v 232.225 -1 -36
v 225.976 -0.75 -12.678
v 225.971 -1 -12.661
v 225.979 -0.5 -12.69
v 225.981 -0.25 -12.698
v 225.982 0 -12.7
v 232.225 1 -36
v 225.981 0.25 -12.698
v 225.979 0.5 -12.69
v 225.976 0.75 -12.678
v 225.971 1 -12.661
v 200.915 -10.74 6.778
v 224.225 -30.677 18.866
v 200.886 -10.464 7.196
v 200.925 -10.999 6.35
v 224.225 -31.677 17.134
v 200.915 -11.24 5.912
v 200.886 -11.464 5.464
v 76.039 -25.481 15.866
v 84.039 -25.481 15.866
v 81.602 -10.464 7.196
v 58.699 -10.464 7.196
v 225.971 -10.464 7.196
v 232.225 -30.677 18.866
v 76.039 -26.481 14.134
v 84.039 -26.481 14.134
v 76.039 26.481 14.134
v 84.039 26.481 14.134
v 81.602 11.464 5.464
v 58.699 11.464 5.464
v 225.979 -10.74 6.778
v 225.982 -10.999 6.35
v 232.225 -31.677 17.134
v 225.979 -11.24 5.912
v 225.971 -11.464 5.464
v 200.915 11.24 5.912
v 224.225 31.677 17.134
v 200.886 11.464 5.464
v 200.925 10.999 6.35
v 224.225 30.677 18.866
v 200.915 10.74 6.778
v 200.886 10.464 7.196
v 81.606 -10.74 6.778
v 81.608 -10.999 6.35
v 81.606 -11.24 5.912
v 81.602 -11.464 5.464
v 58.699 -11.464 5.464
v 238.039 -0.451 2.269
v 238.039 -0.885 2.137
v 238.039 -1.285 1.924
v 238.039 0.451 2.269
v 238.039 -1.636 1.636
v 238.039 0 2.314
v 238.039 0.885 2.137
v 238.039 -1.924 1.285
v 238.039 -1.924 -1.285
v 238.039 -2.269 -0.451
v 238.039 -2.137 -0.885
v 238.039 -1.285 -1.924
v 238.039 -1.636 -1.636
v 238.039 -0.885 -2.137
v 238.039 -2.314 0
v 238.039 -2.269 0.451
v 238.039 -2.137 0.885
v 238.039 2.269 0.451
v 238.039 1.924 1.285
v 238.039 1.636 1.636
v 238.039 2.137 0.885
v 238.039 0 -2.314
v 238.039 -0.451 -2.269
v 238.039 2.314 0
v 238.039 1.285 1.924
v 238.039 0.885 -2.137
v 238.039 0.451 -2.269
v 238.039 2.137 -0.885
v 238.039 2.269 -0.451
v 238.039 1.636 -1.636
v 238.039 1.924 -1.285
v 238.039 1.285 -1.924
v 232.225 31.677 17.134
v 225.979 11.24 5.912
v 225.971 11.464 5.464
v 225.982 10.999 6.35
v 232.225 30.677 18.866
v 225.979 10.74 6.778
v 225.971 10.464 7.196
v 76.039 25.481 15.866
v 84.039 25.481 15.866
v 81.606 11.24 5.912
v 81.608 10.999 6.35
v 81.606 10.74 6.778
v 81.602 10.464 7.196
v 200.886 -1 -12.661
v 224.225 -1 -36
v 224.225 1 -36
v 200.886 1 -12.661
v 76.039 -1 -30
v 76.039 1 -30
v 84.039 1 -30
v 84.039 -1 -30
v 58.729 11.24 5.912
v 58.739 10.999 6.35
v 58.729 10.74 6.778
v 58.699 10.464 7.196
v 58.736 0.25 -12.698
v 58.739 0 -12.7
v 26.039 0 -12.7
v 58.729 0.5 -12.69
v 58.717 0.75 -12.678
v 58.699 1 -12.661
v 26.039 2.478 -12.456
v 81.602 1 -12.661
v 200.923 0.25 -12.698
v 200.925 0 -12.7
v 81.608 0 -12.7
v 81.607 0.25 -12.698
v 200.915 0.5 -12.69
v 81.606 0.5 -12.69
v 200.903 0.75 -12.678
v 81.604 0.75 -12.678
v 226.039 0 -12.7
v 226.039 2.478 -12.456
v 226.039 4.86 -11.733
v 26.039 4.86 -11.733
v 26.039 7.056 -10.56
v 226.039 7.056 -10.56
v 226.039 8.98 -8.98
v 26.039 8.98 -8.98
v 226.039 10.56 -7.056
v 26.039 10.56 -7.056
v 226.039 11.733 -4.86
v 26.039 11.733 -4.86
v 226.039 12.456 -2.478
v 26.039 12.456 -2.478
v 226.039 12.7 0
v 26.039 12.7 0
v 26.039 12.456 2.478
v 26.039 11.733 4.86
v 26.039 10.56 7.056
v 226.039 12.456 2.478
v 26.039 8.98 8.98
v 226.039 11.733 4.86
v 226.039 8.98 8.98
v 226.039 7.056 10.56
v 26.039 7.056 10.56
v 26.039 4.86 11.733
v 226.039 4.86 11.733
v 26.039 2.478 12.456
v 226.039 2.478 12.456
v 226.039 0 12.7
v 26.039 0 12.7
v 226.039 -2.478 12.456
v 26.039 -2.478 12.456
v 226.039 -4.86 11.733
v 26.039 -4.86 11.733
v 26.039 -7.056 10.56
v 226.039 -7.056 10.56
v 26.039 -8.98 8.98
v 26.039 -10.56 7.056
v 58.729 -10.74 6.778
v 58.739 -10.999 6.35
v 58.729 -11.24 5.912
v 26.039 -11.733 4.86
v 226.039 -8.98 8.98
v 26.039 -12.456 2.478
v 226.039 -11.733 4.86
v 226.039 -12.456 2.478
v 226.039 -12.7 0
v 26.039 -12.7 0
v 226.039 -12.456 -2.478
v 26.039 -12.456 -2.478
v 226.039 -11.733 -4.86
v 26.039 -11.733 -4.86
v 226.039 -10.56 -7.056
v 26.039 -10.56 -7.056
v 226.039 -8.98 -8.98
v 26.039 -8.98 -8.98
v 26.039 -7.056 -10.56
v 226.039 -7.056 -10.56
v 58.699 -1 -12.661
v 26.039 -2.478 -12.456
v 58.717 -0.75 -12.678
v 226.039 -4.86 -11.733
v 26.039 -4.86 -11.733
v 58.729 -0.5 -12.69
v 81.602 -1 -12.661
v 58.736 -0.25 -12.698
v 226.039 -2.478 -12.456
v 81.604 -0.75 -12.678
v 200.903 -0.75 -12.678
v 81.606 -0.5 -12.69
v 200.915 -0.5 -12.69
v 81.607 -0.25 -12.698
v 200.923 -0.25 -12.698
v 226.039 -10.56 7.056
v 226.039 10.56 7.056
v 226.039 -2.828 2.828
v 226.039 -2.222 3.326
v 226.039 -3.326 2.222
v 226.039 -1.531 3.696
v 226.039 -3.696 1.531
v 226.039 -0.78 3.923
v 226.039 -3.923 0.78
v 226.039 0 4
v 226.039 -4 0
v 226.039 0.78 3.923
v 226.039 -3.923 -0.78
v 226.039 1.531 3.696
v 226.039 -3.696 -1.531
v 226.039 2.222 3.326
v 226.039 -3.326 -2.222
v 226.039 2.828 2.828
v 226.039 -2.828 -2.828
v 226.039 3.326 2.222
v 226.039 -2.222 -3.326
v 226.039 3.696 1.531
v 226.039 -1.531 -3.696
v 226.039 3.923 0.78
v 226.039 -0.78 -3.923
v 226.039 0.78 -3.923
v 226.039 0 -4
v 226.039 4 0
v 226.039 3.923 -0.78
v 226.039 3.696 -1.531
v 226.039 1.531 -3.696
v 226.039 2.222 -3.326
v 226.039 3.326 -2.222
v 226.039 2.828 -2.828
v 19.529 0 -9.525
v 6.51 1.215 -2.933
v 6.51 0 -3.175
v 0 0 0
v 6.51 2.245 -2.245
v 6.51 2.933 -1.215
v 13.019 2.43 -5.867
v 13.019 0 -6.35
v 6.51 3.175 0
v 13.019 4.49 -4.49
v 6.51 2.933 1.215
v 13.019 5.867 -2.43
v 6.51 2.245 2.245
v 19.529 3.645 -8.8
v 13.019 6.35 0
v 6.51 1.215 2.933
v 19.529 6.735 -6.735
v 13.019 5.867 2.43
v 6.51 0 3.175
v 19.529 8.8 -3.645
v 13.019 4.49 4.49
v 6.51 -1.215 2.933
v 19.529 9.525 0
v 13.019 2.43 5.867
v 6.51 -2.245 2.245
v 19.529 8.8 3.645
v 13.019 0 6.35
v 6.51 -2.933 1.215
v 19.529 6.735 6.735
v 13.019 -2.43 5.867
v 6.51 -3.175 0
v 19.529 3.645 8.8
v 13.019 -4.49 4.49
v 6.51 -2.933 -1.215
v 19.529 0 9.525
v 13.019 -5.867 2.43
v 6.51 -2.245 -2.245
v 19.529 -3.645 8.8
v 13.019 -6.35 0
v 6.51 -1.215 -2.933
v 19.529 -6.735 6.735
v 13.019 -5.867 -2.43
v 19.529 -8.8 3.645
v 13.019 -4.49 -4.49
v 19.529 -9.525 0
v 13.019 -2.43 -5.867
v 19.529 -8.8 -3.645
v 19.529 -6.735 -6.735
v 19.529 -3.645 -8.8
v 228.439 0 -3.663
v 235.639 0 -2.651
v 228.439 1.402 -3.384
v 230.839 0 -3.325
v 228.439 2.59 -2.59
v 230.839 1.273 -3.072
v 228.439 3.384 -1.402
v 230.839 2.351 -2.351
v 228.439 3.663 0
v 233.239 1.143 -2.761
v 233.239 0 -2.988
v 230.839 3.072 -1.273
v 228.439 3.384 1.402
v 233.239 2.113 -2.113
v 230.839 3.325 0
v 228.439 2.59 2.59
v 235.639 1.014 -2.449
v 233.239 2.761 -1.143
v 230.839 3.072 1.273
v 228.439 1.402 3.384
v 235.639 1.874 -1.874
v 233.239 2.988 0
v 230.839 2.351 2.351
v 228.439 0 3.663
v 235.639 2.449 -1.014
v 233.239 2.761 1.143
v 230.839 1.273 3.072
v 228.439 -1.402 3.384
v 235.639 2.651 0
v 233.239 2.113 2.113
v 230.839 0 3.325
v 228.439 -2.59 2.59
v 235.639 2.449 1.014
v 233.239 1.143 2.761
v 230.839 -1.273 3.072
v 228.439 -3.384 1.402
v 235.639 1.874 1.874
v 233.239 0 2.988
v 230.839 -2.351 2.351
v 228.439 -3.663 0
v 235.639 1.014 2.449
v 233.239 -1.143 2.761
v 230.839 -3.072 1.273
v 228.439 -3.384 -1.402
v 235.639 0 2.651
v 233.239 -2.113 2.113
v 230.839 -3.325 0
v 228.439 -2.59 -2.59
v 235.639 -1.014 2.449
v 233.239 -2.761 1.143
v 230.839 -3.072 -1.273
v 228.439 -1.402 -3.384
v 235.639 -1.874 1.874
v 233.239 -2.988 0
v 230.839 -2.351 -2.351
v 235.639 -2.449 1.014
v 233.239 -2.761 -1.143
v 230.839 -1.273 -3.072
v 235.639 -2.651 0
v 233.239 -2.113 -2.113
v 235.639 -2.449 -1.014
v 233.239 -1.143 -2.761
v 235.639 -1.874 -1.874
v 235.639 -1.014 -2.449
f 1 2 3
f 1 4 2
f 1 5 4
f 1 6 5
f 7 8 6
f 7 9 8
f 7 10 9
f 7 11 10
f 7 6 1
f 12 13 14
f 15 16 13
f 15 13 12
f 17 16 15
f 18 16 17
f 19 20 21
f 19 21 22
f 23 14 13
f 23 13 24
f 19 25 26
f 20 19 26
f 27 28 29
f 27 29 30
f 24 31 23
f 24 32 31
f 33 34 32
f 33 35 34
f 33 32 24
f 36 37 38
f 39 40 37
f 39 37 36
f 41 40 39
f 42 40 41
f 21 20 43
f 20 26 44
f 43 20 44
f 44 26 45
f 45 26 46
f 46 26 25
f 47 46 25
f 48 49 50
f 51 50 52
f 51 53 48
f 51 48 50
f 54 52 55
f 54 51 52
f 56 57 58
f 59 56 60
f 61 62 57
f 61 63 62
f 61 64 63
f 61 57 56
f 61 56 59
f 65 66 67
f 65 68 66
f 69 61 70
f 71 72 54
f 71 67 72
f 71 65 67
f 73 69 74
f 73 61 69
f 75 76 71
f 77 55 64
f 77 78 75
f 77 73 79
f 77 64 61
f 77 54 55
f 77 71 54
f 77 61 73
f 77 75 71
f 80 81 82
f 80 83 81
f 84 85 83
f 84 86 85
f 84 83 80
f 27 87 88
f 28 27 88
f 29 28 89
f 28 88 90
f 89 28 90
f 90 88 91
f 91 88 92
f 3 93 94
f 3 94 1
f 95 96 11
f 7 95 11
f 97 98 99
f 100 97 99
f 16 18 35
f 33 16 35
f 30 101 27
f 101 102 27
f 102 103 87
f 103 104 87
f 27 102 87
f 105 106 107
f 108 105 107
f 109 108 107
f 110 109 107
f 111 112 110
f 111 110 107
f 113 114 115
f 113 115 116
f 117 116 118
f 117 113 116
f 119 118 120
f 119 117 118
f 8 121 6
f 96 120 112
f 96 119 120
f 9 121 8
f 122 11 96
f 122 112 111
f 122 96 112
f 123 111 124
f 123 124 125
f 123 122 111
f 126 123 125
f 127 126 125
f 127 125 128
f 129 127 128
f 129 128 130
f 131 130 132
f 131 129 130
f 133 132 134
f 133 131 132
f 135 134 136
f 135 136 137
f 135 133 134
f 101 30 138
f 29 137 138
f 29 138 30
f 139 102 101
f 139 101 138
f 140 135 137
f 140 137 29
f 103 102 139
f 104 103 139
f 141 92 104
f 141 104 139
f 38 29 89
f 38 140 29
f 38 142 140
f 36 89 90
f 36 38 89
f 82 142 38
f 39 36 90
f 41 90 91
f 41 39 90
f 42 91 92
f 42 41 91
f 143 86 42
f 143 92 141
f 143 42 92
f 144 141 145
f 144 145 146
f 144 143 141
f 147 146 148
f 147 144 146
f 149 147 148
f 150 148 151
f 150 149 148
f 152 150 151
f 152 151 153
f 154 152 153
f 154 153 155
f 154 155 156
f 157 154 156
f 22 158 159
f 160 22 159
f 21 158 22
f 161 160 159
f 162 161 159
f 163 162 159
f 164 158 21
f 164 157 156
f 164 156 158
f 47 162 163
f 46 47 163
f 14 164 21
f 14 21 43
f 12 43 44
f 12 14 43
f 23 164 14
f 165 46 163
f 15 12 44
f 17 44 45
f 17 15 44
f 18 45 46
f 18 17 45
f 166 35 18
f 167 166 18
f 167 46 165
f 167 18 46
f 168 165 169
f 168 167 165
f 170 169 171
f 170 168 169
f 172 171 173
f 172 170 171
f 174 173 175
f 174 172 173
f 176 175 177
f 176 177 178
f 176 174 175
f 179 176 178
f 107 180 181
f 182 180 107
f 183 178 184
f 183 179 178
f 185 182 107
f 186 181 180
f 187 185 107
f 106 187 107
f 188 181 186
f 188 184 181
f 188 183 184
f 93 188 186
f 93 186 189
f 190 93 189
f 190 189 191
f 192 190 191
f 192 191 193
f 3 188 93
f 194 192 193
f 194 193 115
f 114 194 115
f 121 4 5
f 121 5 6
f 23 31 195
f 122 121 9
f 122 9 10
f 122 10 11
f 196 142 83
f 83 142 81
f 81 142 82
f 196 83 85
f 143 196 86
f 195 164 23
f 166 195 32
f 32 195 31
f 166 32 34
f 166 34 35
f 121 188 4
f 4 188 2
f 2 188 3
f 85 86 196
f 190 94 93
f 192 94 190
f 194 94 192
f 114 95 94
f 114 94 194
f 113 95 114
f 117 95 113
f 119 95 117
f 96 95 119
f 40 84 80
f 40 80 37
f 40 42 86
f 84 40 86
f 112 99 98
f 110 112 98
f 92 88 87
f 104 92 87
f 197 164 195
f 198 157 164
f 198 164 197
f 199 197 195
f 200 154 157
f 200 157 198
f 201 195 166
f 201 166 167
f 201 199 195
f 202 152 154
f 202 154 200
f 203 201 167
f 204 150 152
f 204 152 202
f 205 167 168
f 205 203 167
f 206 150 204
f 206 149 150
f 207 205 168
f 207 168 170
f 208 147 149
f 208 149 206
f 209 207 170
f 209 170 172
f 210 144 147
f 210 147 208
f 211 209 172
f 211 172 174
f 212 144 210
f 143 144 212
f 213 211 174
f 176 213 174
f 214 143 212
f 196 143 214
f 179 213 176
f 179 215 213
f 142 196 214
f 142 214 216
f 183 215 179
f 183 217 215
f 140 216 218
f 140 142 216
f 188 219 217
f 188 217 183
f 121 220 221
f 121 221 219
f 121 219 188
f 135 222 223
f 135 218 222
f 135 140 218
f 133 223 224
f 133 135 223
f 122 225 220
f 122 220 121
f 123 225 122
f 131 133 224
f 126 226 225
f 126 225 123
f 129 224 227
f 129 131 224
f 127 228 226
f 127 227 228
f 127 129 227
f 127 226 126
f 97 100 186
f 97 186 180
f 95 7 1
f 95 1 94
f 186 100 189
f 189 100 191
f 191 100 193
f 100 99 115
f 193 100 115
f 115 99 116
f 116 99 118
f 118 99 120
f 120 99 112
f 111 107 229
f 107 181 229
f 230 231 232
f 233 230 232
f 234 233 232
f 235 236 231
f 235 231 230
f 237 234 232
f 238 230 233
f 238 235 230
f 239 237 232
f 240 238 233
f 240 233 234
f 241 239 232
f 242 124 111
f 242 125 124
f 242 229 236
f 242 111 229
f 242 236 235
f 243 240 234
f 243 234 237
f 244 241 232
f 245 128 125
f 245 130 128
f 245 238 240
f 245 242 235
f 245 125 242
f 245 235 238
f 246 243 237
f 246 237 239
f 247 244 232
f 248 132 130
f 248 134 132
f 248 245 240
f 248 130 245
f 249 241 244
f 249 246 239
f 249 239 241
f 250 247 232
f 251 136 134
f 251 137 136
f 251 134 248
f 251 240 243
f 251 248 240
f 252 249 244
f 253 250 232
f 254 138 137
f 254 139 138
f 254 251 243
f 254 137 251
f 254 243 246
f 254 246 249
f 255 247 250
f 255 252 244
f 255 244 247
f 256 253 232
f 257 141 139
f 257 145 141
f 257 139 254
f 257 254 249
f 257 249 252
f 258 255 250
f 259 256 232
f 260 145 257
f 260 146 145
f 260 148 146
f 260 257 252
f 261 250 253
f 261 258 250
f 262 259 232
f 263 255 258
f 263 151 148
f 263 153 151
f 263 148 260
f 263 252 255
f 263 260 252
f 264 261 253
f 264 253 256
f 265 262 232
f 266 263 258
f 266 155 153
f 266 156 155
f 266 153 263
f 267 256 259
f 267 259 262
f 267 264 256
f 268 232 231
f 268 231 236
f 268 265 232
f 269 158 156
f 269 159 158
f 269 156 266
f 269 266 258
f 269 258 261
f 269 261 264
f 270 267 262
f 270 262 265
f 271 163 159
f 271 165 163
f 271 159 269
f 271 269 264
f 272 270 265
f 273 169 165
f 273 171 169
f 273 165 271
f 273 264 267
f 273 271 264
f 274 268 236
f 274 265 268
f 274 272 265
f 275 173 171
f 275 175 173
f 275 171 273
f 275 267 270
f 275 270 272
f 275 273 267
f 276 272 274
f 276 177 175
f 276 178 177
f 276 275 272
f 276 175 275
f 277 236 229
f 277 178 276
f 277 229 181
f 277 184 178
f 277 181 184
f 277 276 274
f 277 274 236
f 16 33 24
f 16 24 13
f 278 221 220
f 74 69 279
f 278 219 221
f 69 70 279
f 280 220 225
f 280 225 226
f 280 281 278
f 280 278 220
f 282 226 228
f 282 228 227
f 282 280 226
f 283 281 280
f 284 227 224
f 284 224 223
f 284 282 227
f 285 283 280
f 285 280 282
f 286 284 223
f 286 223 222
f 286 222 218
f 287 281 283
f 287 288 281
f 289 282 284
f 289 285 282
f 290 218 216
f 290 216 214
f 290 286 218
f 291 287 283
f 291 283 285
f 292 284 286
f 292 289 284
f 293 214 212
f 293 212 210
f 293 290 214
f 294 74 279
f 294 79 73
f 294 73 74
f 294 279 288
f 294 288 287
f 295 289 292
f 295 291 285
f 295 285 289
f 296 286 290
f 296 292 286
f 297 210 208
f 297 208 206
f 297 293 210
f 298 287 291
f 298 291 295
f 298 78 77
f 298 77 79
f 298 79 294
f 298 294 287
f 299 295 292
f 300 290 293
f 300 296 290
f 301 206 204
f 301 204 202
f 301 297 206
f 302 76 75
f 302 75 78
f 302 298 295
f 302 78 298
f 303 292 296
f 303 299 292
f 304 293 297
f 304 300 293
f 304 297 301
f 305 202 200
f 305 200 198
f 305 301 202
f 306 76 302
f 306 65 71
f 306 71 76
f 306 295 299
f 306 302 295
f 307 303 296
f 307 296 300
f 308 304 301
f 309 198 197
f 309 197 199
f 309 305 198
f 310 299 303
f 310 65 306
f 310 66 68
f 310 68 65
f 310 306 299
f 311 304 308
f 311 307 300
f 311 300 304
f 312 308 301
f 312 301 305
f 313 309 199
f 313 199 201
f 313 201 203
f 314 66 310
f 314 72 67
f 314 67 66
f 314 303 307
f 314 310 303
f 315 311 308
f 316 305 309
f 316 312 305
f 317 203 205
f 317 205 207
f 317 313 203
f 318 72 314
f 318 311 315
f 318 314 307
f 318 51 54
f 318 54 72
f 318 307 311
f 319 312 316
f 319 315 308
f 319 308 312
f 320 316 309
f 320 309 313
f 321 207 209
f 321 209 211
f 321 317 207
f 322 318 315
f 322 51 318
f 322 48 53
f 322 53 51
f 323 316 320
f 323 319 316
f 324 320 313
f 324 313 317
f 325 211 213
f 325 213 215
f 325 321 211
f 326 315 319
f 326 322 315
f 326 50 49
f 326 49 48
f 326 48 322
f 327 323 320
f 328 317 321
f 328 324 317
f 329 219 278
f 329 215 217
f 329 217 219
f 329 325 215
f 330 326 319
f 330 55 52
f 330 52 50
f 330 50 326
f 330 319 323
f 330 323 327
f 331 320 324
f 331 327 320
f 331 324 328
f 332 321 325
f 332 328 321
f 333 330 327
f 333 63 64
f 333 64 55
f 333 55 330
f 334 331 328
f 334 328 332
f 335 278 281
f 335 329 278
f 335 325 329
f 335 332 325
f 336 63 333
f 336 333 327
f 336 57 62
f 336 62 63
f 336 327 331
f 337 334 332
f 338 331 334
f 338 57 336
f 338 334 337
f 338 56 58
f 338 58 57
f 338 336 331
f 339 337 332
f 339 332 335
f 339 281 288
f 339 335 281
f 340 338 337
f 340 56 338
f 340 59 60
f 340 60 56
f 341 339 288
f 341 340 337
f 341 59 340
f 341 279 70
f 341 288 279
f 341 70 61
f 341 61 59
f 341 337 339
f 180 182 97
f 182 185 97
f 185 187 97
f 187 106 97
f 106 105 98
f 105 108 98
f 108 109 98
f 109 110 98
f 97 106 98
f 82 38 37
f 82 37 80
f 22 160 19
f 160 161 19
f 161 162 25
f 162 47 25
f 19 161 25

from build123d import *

# Parameters (mm, degrees)
RESSALTO_EXTRUS_O2_DEPTH = 1
RESSALTO_EXTRUS_O3_DEPTH = 1
PADR_OCIRCULAR2_COUNT    = 3
ESBO_O4_R                = 4
RESSALTO_EXTRUS_O4_DEPTH = 12
RESSALTO_EXTRUS_O4_TAPER = 8


with BuildPart() as part:
    # Esboço1 → Revolução1 (revolve)
    with BuildSketch(Plane.XY, mode=Mode.PRIVATE) as revolu_o1_sk:
        Polygon((0, 0), (26.038858788, 12.7), (226.038858788, 12.7), (226.038858788, 0), align=None)
    revolve(revolu_o1_sk.sketch.rotate(Axis((-90.349509161, 0, 0), (1, 0, 0)), 270), axis=Axis((-90.349509161, 0, 0), (1, 0, 0)))

    # Esboço3 → Ressalto-extrusão2 (add, symmetric)
    with BuildSketch(Plane(origin=(0, 0, 0), x_dir=(1, 0, 0), z_dir=(0, 1, 0))):
        Polygon((222.578858788, 0), (232.225029716, 36), (224.225029716, 36), (188.225029716, 0), align=None)
    ressalto_extrus_o2 = extrude(amount=RESSALTO_EXTRUS_O2_DEPTH, both=True)

    # Esboço2 → Ressalto-extrusão3 (add, symmetric)
    with BuildSketch(Plane(origin=(0, 0, 0), x_dir=(1, 0, 0), z_dir=(0, 1, 0))):
        Polygon((76.038858788, 30), (84.038858788, 30), (79.822633747, 0), (46.038858788, 0), align=None)
    ressalto_extrus_o3 = extrude(amount=RESSALTO_EXTRUS_O3_DEPTH, both=True)

    # PadrãoCircular2: Ressalto-extrusão2, Ressalto-extrusão3 ×3 about axis
    padr_ocircular2_axis = Axis((0, 0, 0), (1, 0, 0))
    add([ressalto_extrus_o2.rotate(padr_ocircular2_axis, i * 360 / PADR_OCIRCULAR2_COUNT) for i in range(1, PADR_OCIRCULAR2_COUNT)])
    add([ressalto_extrus_o3.rotate(padr_ocircular2_axis, i * 360 / PADR_OCIRCULAR2_COUNT) for i in range(1, PADR_OCIRCULAR2_COUNT)])

    # Esboço4 → Ressalto-extrusão4 (add)
    with BuildSketch(Plane(origin=(226.038858788, 0, 0), x_dir=(0, 0, -1), z_dir=(1, 0, 0))):
        Circle(ESBO_O4_R)
    extrude(amount=RESSALTO_EXTRUS_O4_DEPTH, taper=RESSALTO_EXTRUS_O4_TAPER)


solid = part.part
